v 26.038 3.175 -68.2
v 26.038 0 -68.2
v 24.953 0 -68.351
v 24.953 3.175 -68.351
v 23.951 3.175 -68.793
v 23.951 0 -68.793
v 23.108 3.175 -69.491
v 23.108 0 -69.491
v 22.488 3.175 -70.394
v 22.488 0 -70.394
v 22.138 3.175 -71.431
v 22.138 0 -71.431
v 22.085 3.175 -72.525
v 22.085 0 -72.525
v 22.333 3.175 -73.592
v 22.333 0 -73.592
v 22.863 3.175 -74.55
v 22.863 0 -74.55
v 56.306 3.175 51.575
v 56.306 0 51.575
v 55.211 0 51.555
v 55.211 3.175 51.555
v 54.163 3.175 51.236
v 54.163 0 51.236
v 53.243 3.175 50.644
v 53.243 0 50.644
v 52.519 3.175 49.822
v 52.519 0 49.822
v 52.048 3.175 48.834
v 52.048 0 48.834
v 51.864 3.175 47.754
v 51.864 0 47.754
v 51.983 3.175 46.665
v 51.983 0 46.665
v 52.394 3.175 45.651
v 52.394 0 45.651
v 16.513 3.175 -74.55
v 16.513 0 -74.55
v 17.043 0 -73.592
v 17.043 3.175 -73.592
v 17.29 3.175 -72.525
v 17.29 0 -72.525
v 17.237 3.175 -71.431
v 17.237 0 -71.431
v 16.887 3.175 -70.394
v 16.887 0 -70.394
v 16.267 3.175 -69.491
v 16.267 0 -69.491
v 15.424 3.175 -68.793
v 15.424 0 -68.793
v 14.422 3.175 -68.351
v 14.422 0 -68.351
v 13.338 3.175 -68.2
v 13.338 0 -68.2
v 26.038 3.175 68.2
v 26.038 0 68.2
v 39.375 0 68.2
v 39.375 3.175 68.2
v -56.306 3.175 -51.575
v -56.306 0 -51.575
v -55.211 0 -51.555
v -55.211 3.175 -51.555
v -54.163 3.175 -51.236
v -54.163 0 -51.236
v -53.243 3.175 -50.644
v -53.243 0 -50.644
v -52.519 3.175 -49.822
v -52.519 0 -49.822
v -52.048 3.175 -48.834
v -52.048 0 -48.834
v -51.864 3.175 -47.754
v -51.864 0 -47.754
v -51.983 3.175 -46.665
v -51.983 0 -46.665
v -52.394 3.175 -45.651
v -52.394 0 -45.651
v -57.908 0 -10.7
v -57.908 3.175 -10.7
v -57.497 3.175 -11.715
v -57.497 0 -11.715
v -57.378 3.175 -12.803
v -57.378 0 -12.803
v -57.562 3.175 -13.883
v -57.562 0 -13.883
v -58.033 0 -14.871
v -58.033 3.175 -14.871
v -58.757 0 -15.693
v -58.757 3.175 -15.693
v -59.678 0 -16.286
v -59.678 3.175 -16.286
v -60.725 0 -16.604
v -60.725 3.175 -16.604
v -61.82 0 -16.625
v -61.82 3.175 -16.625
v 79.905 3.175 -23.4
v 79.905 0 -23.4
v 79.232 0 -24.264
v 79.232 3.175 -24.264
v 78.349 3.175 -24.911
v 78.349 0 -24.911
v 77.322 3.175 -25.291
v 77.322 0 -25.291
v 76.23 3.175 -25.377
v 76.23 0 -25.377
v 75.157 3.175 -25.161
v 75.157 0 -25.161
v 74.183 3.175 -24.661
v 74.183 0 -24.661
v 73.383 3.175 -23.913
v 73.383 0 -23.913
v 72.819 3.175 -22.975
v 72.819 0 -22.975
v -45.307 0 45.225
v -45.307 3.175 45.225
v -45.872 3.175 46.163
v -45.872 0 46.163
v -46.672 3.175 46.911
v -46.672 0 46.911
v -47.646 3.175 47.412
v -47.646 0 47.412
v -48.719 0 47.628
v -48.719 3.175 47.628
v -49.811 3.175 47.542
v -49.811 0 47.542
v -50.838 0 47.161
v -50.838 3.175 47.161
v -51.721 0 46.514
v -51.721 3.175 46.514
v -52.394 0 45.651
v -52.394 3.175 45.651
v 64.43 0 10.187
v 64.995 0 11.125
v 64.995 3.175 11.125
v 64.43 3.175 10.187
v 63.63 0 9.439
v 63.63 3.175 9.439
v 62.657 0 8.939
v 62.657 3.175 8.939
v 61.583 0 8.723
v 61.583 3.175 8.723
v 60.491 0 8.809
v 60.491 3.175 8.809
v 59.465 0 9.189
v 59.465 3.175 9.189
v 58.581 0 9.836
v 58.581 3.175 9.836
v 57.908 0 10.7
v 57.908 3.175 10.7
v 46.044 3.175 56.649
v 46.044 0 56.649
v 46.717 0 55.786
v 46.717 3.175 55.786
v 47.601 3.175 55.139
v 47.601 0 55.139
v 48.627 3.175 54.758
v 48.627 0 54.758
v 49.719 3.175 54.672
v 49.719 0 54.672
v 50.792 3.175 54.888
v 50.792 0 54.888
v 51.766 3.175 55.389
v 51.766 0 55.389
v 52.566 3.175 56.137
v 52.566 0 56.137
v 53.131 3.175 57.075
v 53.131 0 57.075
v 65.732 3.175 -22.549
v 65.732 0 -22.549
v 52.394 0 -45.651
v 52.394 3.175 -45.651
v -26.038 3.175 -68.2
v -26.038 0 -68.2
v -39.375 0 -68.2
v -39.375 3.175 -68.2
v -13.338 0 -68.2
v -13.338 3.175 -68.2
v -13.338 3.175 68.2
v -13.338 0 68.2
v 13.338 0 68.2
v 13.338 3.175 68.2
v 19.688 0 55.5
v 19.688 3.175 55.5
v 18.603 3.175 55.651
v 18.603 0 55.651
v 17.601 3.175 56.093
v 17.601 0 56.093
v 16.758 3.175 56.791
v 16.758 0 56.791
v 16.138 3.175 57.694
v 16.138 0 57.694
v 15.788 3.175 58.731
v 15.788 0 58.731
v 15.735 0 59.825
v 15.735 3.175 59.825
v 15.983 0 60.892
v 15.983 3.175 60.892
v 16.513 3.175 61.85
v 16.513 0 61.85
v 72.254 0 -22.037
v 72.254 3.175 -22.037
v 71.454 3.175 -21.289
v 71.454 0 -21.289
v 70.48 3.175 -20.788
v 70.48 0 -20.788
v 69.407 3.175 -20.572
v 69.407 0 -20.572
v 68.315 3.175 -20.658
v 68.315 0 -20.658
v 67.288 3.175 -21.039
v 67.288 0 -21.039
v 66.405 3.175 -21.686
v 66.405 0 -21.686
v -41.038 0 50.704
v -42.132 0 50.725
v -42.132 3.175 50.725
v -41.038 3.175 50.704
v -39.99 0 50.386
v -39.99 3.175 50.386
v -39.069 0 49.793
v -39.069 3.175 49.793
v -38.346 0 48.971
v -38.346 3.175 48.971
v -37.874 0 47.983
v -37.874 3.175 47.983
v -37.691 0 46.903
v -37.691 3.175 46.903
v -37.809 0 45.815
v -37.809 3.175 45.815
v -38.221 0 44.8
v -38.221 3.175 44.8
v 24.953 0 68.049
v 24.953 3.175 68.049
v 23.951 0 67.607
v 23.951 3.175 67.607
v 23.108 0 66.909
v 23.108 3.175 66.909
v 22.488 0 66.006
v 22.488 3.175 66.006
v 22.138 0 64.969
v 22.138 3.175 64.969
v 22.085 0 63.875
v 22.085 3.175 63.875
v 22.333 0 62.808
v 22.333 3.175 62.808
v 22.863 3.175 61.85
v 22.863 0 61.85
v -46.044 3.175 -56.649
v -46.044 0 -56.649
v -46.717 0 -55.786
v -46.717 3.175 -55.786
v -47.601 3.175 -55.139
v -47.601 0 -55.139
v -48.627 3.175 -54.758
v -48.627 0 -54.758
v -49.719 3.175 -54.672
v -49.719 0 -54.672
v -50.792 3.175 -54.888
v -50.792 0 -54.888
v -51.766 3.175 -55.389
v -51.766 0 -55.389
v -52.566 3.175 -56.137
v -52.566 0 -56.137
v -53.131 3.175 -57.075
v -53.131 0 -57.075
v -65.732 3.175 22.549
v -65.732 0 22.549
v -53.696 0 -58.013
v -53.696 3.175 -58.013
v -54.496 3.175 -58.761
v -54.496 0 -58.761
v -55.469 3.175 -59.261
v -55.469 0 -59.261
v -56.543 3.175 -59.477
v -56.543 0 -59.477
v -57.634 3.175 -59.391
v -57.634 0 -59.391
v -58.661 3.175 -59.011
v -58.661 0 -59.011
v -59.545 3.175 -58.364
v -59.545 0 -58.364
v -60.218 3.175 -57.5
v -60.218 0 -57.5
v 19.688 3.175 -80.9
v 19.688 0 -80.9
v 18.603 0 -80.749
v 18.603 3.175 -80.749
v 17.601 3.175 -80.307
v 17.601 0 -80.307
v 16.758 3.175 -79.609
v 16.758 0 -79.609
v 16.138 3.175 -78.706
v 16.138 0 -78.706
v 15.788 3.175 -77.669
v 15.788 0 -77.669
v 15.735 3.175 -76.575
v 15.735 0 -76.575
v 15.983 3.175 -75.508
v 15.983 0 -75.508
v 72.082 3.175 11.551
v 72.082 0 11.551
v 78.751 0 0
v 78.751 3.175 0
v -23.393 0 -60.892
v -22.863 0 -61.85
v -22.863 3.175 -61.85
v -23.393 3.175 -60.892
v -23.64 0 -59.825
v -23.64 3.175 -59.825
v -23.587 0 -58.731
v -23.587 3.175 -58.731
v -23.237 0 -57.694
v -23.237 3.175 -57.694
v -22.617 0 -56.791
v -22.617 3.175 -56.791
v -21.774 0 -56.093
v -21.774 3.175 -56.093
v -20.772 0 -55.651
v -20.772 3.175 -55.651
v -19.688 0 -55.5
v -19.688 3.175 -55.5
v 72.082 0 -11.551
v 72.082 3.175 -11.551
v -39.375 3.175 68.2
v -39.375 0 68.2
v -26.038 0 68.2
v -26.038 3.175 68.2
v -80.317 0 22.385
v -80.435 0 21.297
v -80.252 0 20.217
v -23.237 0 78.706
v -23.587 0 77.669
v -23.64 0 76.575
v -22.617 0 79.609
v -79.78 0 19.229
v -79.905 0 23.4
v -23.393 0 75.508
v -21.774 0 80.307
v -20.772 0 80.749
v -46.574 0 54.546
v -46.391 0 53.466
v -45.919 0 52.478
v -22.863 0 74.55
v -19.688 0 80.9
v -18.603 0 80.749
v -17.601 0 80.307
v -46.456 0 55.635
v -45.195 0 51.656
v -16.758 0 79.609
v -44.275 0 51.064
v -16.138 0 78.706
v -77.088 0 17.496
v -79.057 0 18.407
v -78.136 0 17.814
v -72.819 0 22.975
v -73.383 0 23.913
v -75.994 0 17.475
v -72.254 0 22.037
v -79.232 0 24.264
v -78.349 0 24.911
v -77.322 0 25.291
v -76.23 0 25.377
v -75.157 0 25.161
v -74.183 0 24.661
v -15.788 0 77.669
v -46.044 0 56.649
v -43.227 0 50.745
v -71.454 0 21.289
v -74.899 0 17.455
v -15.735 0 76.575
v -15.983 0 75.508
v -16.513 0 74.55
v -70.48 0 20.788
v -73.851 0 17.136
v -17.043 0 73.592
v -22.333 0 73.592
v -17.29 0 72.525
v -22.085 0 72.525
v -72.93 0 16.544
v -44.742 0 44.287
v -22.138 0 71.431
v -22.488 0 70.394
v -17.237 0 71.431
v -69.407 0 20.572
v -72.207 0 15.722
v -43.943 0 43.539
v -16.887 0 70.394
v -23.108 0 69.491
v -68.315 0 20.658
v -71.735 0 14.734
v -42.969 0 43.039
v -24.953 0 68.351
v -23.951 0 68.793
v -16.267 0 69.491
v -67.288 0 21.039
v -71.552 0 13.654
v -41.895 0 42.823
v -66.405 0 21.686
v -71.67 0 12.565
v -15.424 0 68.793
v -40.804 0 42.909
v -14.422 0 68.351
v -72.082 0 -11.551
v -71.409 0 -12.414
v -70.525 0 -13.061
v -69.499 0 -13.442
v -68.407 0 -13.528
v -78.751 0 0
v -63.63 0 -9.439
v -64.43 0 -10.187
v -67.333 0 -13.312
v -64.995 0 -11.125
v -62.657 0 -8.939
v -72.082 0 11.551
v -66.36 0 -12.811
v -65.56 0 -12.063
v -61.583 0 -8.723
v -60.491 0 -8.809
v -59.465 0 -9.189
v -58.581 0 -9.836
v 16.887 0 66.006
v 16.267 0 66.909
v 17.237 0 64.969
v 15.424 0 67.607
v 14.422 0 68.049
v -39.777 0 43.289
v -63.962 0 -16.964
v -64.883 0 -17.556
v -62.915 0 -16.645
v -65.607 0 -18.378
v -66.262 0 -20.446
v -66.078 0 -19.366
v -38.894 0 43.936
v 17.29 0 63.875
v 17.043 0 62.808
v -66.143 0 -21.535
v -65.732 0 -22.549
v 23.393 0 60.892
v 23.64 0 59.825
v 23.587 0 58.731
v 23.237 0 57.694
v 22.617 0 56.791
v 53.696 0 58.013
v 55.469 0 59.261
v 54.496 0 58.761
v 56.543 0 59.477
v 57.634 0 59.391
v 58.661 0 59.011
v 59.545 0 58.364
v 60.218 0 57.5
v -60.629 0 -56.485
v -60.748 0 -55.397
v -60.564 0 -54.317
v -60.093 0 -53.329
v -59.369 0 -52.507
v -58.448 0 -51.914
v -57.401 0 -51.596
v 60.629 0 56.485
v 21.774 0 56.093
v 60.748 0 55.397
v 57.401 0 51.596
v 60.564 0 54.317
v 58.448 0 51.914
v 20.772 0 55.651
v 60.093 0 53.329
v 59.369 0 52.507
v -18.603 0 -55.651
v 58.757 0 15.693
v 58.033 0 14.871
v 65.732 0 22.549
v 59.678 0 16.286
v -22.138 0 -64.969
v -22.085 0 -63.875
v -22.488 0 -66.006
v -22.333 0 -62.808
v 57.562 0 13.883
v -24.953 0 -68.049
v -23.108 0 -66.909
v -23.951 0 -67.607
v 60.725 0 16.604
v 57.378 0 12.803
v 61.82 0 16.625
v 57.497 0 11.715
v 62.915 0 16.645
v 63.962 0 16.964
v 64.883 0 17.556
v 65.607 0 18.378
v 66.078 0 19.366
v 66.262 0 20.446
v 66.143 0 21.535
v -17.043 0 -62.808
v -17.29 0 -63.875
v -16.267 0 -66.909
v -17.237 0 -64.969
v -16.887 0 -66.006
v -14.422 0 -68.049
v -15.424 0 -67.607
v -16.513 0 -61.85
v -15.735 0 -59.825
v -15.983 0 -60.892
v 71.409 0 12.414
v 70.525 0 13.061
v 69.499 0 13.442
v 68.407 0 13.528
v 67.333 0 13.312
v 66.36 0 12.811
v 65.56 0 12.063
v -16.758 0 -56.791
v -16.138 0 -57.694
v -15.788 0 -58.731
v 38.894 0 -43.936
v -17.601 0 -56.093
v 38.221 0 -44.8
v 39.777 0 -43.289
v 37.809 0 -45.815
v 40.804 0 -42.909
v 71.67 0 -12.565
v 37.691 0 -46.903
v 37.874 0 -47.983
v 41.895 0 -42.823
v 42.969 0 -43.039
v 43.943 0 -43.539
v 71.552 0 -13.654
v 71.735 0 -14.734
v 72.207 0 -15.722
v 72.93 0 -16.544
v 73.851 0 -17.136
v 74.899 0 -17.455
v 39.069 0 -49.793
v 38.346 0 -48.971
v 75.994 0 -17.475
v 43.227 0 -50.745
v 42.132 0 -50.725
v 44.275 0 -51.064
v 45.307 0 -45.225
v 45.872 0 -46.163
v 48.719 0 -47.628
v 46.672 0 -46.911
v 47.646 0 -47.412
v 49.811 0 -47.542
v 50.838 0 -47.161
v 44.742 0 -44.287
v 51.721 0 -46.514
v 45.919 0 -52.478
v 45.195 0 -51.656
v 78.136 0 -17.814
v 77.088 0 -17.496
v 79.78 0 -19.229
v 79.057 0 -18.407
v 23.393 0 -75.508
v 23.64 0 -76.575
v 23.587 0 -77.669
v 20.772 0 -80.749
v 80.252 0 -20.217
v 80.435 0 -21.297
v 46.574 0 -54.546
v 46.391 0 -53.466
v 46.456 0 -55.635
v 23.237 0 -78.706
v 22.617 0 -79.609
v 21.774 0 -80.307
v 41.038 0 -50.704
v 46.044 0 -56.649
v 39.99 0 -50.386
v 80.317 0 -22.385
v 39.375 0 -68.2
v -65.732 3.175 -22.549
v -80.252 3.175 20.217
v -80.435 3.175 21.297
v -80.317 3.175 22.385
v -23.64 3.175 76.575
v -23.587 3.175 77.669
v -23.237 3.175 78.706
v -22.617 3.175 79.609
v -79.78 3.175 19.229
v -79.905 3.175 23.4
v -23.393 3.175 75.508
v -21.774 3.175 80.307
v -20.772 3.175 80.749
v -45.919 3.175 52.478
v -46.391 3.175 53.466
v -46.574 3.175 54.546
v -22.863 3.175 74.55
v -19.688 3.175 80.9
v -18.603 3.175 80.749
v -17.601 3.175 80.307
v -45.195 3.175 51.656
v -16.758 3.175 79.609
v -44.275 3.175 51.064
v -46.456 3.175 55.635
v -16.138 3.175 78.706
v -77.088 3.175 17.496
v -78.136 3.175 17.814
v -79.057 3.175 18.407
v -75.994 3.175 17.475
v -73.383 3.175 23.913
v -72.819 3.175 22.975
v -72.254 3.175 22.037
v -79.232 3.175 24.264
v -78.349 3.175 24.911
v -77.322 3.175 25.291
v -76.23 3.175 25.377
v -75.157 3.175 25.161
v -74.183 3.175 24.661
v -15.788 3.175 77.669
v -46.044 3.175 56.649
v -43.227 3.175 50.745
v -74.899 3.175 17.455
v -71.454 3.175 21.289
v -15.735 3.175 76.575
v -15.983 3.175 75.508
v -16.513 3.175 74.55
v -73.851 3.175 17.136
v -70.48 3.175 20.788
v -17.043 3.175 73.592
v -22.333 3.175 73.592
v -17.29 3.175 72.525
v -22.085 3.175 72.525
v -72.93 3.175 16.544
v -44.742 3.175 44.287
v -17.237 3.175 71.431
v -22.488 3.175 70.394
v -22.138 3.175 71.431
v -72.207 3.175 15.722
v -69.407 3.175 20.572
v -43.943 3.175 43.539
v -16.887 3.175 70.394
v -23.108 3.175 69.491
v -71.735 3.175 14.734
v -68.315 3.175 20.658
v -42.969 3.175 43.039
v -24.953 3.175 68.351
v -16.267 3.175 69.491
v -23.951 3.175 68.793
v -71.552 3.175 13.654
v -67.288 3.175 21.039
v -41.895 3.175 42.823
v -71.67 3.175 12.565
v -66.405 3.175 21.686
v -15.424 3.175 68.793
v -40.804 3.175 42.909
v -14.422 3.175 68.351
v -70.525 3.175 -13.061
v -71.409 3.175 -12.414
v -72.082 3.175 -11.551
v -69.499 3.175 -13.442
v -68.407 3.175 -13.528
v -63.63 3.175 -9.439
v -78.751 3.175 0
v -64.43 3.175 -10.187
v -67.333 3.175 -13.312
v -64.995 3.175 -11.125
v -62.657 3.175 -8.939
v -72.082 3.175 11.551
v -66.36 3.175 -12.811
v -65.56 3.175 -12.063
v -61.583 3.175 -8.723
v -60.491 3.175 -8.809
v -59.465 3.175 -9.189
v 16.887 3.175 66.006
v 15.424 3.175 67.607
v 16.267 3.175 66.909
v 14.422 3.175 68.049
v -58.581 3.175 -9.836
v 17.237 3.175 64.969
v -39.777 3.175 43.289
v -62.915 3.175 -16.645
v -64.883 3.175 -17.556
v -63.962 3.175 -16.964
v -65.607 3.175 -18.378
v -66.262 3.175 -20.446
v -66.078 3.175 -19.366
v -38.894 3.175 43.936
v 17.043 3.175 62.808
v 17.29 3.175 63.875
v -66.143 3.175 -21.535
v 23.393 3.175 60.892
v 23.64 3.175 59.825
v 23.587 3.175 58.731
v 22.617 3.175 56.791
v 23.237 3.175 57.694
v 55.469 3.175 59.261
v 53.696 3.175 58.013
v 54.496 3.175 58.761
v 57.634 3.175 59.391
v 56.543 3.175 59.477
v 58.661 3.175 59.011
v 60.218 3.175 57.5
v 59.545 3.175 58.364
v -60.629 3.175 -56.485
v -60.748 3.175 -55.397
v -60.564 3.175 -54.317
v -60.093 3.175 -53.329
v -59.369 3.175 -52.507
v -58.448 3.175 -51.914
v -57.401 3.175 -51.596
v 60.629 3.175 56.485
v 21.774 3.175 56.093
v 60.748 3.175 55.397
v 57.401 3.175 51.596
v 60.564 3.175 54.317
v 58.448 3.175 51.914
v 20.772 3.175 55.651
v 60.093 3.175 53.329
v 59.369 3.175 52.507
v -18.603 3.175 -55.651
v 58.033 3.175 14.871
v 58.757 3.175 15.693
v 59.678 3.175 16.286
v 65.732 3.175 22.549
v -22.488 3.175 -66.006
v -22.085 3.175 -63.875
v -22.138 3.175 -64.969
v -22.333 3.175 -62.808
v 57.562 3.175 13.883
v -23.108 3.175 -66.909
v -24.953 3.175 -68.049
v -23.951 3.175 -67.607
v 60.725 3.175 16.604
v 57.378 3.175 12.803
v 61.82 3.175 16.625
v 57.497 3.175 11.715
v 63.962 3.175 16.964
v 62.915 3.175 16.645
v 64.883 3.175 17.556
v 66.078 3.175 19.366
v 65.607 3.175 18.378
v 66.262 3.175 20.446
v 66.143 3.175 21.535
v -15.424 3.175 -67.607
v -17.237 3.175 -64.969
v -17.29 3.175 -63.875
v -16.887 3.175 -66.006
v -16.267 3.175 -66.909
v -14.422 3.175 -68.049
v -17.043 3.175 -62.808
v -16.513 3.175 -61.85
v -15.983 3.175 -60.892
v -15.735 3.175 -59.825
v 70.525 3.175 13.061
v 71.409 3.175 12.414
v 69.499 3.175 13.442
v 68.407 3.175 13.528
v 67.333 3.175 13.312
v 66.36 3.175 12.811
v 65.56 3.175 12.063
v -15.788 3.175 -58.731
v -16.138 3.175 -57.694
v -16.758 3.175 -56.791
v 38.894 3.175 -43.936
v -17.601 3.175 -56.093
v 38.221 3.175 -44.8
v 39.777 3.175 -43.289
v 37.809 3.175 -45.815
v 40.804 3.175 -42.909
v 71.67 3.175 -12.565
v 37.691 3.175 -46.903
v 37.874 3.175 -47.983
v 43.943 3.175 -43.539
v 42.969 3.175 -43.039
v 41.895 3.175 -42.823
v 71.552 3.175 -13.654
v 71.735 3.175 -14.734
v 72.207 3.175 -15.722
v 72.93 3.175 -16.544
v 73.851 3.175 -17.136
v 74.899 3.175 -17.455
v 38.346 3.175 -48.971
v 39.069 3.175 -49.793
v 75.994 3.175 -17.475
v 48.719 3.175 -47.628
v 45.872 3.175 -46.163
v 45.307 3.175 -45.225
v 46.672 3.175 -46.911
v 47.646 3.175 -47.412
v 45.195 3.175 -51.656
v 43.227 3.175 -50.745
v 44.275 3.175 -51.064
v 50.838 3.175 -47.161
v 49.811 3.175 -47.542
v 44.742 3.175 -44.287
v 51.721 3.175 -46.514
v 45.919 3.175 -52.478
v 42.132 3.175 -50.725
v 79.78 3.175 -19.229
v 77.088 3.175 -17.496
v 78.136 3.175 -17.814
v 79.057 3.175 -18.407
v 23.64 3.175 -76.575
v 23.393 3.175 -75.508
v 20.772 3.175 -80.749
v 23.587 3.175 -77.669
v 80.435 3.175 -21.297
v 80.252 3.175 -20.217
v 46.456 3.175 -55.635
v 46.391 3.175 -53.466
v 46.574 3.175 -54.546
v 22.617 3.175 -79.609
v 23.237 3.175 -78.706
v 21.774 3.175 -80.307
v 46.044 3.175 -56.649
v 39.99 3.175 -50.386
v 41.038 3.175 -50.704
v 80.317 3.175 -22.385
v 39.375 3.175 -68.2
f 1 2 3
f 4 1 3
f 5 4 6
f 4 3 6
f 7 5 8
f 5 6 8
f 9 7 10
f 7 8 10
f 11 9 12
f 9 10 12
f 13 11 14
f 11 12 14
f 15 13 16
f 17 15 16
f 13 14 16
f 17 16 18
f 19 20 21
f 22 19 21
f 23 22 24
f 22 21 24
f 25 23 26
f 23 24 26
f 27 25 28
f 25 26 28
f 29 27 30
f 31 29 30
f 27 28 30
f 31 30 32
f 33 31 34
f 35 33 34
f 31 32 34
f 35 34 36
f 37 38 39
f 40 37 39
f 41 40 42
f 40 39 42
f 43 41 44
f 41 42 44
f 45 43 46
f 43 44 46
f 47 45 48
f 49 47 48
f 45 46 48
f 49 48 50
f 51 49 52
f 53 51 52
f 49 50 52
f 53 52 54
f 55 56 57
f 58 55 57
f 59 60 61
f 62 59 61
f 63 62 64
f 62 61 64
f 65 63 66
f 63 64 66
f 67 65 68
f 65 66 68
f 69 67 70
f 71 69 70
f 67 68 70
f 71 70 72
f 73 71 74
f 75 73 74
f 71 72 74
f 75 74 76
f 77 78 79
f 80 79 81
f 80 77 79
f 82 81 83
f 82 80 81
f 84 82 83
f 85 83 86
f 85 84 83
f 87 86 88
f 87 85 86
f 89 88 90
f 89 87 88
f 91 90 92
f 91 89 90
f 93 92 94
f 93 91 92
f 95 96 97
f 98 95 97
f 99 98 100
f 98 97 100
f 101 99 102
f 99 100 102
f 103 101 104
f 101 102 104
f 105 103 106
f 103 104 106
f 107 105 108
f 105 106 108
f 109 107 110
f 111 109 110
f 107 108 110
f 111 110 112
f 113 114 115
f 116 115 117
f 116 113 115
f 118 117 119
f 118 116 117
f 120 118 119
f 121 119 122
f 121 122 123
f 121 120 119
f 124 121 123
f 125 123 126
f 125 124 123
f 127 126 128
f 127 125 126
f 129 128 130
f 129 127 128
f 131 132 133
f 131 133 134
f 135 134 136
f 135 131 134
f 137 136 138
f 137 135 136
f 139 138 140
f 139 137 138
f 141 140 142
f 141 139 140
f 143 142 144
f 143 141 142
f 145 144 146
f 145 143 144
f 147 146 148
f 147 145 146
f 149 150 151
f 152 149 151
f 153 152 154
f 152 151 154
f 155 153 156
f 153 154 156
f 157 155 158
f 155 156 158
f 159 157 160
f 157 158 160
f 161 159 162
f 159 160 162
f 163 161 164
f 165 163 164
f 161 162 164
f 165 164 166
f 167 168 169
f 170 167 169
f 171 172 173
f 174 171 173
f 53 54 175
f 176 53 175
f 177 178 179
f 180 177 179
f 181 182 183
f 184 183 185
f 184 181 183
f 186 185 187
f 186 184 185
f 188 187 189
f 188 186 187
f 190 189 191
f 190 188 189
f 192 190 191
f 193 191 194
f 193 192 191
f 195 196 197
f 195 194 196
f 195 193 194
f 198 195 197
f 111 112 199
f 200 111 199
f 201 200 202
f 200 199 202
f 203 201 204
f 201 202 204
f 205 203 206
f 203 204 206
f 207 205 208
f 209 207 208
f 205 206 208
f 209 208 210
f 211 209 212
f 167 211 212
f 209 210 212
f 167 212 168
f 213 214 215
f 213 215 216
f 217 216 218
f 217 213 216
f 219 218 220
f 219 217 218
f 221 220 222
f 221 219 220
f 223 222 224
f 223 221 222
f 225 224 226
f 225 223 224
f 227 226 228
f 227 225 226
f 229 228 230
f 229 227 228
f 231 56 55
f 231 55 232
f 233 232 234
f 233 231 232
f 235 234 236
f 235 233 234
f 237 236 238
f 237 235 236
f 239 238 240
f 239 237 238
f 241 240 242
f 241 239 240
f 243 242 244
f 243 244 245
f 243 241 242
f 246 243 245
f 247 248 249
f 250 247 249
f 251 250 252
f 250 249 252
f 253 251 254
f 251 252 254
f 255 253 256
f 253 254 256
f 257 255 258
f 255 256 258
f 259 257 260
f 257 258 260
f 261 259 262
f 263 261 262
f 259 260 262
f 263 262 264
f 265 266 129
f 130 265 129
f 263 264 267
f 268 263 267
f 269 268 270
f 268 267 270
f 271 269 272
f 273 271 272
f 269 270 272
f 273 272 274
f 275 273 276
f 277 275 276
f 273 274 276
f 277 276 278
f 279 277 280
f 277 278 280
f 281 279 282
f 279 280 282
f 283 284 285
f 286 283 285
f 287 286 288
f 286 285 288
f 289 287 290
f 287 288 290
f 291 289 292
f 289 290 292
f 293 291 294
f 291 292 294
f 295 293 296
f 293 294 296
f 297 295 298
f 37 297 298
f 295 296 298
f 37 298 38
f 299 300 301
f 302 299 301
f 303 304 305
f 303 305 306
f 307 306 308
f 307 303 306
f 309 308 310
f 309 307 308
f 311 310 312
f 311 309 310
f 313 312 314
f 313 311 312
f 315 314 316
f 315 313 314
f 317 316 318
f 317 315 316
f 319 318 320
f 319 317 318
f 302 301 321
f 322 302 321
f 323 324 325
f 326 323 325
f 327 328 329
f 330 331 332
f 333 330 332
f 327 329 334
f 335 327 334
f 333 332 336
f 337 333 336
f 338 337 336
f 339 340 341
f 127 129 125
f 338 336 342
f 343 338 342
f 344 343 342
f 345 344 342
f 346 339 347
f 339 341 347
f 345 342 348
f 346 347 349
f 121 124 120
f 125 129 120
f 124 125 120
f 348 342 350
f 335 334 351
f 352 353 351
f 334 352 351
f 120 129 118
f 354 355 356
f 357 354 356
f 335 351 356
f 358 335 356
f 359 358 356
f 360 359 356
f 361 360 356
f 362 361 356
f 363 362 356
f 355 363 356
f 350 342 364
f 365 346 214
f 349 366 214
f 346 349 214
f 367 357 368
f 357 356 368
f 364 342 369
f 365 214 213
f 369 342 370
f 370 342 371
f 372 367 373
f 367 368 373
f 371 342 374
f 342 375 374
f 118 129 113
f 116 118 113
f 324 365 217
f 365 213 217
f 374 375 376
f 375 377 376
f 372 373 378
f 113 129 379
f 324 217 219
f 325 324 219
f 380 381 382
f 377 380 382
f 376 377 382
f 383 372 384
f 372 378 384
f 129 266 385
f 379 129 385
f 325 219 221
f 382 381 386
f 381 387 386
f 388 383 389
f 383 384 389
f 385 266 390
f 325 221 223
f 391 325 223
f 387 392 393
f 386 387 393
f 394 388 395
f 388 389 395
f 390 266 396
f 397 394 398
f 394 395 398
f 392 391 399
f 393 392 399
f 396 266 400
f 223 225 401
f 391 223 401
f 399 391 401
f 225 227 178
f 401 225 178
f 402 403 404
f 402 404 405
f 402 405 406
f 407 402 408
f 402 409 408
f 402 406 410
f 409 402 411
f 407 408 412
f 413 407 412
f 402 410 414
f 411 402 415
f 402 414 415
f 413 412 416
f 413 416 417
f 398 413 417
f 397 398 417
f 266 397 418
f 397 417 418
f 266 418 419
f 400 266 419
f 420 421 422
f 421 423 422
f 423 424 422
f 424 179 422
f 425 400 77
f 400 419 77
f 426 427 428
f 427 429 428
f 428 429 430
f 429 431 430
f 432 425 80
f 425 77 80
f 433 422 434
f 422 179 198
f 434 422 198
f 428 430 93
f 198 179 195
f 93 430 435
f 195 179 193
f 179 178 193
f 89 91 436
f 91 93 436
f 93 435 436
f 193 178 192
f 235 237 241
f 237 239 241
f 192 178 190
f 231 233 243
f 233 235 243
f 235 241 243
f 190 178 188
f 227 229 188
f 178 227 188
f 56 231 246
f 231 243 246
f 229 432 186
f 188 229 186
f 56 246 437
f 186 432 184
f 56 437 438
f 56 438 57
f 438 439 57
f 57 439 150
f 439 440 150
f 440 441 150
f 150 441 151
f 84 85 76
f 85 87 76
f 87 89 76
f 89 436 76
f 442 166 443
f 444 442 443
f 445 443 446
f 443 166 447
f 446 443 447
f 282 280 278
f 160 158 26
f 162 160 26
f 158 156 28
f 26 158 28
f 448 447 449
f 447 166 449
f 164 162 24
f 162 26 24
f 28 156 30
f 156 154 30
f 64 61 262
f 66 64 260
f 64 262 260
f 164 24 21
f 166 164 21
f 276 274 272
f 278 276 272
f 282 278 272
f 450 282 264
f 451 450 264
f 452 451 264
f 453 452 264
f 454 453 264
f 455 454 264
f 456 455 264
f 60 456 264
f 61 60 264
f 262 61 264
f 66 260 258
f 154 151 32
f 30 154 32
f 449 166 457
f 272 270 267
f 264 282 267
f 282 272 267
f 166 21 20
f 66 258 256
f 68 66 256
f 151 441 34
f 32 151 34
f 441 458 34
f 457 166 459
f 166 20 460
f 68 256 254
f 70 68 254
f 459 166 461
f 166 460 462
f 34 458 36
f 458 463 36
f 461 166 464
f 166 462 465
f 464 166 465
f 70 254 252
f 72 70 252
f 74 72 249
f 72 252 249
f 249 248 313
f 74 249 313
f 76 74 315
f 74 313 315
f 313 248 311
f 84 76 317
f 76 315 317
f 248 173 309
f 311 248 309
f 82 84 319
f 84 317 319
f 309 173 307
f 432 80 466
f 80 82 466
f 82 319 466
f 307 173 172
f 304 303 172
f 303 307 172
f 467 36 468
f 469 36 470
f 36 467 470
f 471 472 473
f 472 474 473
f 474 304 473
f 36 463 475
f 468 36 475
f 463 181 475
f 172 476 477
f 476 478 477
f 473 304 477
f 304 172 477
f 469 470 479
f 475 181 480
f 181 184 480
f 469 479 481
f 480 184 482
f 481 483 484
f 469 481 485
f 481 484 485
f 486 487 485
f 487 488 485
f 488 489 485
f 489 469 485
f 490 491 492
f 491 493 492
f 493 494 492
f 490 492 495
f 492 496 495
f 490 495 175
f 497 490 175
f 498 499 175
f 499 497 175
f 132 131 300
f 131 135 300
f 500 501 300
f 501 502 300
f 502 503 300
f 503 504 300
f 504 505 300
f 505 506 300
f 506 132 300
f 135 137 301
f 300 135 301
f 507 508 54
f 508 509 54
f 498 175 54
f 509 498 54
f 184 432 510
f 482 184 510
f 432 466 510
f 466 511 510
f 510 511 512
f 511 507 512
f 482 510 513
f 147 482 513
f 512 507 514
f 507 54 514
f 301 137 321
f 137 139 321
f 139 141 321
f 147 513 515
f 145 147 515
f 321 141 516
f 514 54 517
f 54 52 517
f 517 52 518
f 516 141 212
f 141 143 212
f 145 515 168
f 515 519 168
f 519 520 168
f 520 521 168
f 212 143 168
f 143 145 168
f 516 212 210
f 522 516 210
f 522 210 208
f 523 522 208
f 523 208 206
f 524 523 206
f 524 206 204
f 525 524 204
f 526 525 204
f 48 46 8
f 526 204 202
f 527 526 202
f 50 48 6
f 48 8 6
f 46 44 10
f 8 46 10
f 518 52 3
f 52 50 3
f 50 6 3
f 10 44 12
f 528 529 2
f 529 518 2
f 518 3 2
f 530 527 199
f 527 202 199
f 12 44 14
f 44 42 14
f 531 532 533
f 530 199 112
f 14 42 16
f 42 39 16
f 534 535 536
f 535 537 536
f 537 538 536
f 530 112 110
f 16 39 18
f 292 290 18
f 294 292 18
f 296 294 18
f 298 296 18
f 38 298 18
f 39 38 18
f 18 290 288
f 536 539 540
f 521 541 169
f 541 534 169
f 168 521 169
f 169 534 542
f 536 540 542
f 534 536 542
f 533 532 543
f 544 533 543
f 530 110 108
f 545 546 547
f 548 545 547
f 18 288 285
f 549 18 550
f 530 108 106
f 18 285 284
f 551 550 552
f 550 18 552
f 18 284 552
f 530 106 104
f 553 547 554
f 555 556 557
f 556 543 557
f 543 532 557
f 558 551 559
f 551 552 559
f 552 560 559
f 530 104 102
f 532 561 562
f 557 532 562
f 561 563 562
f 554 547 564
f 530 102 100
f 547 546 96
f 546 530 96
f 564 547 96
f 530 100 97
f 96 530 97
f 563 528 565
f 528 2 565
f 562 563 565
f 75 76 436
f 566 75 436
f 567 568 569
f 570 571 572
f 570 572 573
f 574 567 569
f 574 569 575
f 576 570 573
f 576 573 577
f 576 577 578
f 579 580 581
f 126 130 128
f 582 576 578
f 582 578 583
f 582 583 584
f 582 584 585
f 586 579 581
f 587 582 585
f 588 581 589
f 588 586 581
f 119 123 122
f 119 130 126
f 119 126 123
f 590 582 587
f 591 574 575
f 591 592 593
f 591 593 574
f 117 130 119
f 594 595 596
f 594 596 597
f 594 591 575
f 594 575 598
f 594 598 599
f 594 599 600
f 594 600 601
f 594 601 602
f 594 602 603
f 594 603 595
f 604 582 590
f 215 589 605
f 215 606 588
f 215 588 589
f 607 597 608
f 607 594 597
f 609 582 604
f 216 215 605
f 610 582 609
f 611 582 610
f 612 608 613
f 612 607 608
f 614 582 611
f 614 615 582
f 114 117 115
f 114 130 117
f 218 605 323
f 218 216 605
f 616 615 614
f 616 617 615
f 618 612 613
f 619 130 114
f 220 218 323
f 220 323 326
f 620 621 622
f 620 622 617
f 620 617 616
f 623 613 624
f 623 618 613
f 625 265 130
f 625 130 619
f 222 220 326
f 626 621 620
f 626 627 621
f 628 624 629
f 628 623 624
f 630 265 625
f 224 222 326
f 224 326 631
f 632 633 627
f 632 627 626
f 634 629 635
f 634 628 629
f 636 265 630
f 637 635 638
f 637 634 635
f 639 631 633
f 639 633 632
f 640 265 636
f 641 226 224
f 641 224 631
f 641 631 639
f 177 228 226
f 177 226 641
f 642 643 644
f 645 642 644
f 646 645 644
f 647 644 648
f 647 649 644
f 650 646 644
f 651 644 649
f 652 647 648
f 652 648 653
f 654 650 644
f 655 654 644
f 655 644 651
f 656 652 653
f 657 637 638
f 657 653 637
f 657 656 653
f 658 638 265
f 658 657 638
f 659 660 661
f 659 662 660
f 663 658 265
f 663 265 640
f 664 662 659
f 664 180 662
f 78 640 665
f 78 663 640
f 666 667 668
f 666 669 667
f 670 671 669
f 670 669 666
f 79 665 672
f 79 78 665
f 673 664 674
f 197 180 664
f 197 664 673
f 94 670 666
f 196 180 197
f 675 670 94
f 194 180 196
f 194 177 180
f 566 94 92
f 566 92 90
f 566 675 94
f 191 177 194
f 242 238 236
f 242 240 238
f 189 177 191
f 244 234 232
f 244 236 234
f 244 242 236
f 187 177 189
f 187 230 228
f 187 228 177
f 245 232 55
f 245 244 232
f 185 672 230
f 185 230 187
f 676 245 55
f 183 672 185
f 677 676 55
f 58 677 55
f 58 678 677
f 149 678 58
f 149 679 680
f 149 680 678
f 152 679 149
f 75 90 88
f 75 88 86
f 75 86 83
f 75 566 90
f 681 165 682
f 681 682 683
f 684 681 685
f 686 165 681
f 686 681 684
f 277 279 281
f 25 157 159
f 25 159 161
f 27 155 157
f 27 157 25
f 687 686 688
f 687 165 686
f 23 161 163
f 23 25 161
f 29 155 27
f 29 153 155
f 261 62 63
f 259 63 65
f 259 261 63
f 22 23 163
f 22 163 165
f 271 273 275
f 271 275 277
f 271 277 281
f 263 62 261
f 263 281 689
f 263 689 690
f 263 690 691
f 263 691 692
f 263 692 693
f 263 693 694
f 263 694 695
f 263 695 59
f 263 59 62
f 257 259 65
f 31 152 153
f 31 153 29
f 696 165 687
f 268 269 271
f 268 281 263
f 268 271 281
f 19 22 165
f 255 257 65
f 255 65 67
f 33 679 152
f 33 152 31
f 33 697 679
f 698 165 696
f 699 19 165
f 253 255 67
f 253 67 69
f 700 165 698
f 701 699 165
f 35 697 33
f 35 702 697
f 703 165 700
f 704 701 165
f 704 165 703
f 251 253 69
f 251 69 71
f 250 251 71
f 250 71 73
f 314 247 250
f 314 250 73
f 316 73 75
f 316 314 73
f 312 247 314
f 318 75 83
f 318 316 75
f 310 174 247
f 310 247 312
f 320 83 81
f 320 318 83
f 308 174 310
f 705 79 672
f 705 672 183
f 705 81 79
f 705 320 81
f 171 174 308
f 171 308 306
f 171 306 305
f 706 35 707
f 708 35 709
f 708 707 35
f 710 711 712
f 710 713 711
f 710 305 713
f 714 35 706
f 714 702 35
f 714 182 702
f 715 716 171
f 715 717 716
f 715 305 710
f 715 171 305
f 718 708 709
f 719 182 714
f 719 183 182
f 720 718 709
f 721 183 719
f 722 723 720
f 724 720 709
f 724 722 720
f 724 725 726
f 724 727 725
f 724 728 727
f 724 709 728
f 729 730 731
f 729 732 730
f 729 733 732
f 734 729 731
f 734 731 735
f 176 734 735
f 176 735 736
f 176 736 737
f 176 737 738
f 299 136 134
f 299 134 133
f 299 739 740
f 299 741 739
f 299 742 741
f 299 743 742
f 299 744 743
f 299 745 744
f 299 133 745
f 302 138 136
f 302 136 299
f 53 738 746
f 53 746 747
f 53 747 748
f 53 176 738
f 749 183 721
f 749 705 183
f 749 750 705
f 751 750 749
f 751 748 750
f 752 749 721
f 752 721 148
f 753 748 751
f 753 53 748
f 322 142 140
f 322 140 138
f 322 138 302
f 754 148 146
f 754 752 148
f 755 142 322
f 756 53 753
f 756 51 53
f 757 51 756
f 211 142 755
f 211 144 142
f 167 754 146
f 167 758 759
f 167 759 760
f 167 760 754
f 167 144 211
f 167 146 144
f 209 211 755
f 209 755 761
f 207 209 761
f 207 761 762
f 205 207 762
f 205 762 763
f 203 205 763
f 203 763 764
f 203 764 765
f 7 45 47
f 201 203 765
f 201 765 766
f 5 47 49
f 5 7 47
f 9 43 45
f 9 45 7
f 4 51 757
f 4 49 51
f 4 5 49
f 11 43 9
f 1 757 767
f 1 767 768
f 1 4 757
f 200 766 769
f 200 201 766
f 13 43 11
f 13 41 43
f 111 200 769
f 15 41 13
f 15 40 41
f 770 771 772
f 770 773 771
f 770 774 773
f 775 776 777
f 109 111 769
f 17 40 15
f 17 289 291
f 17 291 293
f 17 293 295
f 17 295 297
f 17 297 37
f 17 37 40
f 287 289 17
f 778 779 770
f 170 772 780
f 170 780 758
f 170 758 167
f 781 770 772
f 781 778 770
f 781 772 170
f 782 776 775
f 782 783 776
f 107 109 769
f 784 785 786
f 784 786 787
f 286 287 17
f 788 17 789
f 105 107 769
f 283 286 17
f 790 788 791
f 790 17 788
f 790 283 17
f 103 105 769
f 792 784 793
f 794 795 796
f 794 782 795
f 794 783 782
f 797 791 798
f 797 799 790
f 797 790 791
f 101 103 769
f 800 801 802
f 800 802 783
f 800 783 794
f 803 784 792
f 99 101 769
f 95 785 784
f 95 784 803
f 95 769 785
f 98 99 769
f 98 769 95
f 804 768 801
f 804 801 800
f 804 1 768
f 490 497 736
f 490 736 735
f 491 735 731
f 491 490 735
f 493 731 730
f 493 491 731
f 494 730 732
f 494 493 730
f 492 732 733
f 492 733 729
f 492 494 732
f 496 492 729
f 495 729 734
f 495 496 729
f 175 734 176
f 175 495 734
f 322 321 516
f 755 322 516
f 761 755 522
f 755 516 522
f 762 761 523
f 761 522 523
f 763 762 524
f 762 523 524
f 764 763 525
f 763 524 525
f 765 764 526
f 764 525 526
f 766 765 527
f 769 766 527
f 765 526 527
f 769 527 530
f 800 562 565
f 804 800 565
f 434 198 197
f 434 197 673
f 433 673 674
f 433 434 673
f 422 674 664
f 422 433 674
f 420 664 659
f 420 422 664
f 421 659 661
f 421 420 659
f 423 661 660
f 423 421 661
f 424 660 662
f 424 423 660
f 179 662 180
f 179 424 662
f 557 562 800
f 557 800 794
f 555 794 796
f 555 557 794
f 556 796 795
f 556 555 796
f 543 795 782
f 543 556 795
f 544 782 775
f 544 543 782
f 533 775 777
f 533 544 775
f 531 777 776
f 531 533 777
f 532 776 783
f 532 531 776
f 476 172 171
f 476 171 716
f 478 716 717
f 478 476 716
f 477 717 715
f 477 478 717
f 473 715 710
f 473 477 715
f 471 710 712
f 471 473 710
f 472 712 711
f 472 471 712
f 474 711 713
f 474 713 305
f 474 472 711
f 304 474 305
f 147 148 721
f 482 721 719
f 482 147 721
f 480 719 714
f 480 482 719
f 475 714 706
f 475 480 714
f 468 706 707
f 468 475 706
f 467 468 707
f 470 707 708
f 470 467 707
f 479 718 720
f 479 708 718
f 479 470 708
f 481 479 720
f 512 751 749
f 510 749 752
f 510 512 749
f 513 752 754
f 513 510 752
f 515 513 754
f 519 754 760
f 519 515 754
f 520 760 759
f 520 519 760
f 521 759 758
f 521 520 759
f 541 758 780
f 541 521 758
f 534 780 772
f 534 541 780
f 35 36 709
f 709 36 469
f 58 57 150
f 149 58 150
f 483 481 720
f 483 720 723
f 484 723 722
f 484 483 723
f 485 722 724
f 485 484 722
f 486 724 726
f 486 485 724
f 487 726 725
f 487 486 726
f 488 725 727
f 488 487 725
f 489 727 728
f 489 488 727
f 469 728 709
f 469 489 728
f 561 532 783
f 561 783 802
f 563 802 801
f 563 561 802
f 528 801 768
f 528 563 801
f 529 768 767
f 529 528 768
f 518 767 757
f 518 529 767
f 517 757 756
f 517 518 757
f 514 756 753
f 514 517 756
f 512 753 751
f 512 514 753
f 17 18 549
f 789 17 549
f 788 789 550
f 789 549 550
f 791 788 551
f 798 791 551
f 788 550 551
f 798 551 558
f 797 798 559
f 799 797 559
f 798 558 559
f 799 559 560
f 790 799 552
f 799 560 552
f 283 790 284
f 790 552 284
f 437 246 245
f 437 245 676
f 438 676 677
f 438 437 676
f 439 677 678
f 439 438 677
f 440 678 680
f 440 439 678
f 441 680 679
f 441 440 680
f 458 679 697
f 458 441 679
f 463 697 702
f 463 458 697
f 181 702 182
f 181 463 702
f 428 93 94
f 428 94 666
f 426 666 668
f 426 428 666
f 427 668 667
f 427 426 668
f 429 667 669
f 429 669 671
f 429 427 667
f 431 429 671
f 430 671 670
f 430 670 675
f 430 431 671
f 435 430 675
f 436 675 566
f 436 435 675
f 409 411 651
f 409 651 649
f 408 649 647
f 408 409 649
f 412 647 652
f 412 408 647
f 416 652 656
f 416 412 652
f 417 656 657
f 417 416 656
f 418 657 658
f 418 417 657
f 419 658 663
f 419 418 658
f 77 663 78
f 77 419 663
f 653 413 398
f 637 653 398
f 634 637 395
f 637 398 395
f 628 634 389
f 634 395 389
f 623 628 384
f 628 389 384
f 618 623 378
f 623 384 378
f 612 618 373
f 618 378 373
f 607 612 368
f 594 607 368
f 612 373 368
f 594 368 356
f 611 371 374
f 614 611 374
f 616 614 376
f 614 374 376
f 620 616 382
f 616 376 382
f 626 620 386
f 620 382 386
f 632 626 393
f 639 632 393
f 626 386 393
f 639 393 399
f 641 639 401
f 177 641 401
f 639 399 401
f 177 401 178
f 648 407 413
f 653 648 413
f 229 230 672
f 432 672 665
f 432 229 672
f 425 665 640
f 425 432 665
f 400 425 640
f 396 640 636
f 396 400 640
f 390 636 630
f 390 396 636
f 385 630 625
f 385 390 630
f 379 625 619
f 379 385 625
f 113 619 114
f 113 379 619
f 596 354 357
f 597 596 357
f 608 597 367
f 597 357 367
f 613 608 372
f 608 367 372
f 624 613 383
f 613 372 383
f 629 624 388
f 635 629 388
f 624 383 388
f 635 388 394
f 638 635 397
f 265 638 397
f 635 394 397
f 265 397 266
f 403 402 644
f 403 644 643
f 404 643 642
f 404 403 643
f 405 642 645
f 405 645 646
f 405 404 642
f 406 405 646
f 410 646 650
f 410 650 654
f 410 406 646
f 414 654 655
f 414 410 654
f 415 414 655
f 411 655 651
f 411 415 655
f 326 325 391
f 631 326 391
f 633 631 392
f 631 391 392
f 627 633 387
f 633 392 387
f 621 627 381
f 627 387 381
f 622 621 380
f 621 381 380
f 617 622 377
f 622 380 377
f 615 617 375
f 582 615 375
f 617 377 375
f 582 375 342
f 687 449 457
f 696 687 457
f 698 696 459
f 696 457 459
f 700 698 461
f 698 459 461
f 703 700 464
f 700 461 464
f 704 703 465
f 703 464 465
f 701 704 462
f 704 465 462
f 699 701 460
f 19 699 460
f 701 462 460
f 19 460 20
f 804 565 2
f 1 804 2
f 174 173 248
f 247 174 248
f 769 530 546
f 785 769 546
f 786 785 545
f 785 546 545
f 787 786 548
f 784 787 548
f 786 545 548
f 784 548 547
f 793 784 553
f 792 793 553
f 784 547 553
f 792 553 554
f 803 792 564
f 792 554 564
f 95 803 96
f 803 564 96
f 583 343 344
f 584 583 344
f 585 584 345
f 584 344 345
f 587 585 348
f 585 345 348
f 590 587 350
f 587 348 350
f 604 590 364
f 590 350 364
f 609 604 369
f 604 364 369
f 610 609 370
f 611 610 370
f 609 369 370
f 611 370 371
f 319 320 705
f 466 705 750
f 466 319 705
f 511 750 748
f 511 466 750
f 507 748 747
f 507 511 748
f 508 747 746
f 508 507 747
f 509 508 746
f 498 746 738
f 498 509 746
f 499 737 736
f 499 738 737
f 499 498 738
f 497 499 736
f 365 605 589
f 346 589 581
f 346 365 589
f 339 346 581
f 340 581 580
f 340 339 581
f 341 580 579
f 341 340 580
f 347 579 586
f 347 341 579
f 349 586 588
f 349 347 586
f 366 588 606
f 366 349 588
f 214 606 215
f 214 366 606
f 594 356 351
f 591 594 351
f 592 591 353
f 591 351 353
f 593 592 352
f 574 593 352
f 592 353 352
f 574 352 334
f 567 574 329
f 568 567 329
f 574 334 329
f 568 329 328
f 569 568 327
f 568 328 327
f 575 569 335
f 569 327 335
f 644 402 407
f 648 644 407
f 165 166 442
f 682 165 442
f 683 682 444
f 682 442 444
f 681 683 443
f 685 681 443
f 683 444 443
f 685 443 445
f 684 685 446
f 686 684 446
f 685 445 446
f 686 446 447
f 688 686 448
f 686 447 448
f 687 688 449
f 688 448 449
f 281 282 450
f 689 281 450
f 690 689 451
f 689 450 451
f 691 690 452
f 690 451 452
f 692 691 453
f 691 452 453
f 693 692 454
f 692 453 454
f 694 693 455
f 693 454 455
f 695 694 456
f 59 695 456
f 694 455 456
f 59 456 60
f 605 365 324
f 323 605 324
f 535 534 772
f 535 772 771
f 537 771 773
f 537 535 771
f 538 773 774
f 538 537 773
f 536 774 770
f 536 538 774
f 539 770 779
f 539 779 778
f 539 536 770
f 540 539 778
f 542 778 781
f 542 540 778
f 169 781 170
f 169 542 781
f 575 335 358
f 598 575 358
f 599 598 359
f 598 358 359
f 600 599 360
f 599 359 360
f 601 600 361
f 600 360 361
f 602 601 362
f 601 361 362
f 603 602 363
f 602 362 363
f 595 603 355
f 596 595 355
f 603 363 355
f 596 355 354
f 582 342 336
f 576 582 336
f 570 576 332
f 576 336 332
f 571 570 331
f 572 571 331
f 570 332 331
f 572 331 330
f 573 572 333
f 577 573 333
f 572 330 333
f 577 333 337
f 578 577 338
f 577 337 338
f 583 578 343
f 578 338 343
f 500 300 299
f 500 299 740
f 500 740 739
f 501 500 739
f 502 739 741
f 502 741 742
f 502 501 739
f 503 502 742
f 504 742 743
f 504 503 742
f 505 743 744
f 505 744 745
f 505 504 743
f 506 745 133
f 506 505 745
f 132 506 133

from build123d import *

# Parameters (mm, degrees)
BOSS_EXTRUDE1_DEPTH = 3.175
BOSS_EXTRUDE2_DEPTH = 3.175
CUT_EXTRUDE2_DEPTH  = 113.944871324
CIRPATTERN1_COUNT   = 6


with BuildPart() as part:
    # Sketch1 → Boss-Extrude1 (new body)
    with BuildSketch(Plane(origin=(0, 0, 0), x_dir=(1, 0, 0), z_dir=(0, 1, 0))):
        Polygon((-39.375288359, 68.2), (-78.750576717, 0), (-39.375288359, -68.2), (39.375288359, -68.2), (78.750576717, 0), (39.375288359, 68.2), align=None)
    extrude(amount=BOSS_EXTRUDE1_DEPTH)

    # Sketch2 → Boss-Extrude2 (add)
    with BuildSketch(Plane(origin=(0, 0, 0), x_dir=(1, 0, 0), z_dir=(0, 1, 0))):
        with BuildLine():
            ThreePointArc((16.512644179, 74.55), (16.887402094, 70.393871043), (13.337644179, 68.2))
            Line((13.337644179, 68.2), (26.037644179, 68.2))
            ThreePointArc((26.037644179, 68.2), (22.487886265, 70.393871043), (22.862644179, 74.55))
            ThreePointArc((22.862644179, 74.55), (23.237402094, 78.706128957), (19.687644179, 80.9))
            ThreePointArc((19.687644179, 80.9), (16.137886265, 78.706128957), (16.512644179, 74.55))
        make_face()
    boss_extrude2 = extrude(amount=BOSS_EXTRUDE2_DEPTH)

    # Sketch2<3> → Cut-Extrude2 (cut, through all)
    with BuildSketch(Plane(origin=(0, 0, 0), x_dir=(1, 0, 0), z_dir=(0, 1, 0))):
        with BuildLine():
            Line((-13.337644179, 68.2), (-26.037644179, 68.2))
            ThreePointArc((-26.037644179, 68.2), (-22.487886265, 66.006128957), (-22.862644179, 61.85))
            ThreePointArc((-22.862644179, 61.85), (-23.237402094, 57.693871043), (-19.687644179, 55.5))
            ThreePointArc((-19.687644179, 55.5), (-16.137886265, 57.693871043), (-16.512644179, 61.85))
            ThreePointArc((-16.512644179, 61.85), (-16.887402094, 66.006128957), (-13.337644179, 68.2))
        make_face()
    cut_extrude2 = extrude(amount=CUT_EXTRUDE2_DEPTH, mode=Mode.SUBTRACT)

    # CirPattern1: Boss-Extrude2, Cut-Extrude2 ×6 about axis
    cirpattern1_axis = Axis((0, 0, 0), (0, 1, 0))
    add([boss_extrude2.rotate(cirpattern1_axis, i * 360 / CIRPATTERN1_COUNT) for i in range(1, CIRPATTERN1_COUNT)])
    add([cut_extrude2.rotate(cirpattern1_axis, i * 360 / CIRPATTERN1_COUNT) for i in range(1, CIRPATTERN1_COUNT)], mode=Mode.SUBTRACT)


solid = part.part
